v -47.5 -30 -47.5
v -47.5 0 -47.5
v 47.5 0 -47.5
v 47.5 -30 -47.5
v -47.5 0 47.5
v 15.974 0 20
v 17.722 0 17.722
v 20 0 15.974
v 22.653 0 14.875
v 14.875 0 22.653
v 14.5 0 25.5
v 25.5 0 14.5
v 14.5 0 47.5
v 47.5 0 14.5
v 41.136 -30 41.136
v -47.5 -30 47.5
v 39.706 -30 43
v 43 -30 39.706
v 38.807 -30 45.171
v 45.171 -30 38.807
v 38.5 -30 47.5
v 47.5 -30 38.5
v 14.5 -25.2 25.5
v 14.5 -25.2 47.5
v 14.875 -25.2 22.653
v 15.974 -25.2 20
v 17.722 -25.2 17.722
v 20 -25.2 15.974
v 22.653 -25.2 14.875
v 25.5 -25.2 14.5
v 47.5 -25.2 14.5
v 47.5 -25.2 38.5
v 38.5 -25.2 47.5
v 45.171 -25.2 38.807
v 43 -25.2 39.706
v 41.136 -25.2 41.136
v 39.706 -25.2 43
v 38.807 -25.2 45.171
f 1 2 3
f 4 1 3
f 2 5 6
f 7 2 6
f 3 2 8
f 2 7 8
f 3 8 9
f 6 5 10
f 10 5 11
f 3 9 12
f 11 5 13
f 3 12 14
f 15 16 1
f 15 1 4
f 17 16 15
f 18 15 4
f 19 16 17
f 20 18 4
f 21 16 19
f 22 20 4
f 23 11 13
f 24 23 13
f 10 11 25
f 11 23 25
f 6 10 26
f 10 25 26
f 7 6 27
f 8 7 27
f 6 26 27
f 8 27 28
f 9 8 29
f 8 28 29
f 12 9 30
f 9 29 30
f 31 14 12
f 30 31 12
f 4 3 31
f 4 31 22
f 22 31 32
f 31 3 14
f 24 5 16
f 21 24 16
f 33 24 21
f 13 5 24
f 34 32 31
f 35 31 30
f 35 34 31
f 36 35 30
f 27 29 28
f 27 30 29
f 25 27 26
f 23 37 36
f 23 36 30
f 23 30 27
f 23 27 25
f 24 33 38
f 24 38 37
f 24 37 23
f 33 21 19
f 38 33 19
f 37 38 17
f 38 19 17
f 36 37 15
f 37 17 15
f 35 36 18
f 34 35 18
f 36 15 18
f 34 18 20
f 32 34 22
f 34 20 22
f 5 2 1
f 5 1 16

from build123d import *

# Parameters (mm, degrees)
F0_W     = 95
F0_H     = 95
F1_DEPTH = 30
F2_R     = 9
F3_DEPTH = 40
F4_W     = 66
F4_H     = 66
F5_DEPTH = 25.2
F6_R     = 11


with BuildPart() as f1:
    # F0 (on Front) → F1 (new body)
    with BuildSketch(Plane.XZ):
        Rectangle(F0_W, F0_H)
    extrude(amount=F1_DEPTH)

    # F2 (on face) → F3 (cut)
    with BuildSketch(Plane.XZ.offset(30)):
        with Locations((47.5, 47.5)):
            Circle(F2_R)
    extrude(amount=-F3_DEPTH, mode=Mode.SUBTRACT)

    # F4 (on face) → F5 (cut)
    with BuildSketch(Plane(origin=(0, 0, 0), x_dir=(-1, 0, 0), z_dir=(0, 1, 0))):
        with Locations((-47.5, 47.5)):
            Rectangle(F4_W, F4_H)
    extrude(amount=-F5_DEPTH, mode=Mode.SUBTRACT)

    # F6
    f6_edges = [f1.edges().sort_by_distance(p)[0] for p in [
        (14.5, -12.6, 14.5),
    ]]
    fillet(f6_edges, radius=F6_R)


solid = f1.part
